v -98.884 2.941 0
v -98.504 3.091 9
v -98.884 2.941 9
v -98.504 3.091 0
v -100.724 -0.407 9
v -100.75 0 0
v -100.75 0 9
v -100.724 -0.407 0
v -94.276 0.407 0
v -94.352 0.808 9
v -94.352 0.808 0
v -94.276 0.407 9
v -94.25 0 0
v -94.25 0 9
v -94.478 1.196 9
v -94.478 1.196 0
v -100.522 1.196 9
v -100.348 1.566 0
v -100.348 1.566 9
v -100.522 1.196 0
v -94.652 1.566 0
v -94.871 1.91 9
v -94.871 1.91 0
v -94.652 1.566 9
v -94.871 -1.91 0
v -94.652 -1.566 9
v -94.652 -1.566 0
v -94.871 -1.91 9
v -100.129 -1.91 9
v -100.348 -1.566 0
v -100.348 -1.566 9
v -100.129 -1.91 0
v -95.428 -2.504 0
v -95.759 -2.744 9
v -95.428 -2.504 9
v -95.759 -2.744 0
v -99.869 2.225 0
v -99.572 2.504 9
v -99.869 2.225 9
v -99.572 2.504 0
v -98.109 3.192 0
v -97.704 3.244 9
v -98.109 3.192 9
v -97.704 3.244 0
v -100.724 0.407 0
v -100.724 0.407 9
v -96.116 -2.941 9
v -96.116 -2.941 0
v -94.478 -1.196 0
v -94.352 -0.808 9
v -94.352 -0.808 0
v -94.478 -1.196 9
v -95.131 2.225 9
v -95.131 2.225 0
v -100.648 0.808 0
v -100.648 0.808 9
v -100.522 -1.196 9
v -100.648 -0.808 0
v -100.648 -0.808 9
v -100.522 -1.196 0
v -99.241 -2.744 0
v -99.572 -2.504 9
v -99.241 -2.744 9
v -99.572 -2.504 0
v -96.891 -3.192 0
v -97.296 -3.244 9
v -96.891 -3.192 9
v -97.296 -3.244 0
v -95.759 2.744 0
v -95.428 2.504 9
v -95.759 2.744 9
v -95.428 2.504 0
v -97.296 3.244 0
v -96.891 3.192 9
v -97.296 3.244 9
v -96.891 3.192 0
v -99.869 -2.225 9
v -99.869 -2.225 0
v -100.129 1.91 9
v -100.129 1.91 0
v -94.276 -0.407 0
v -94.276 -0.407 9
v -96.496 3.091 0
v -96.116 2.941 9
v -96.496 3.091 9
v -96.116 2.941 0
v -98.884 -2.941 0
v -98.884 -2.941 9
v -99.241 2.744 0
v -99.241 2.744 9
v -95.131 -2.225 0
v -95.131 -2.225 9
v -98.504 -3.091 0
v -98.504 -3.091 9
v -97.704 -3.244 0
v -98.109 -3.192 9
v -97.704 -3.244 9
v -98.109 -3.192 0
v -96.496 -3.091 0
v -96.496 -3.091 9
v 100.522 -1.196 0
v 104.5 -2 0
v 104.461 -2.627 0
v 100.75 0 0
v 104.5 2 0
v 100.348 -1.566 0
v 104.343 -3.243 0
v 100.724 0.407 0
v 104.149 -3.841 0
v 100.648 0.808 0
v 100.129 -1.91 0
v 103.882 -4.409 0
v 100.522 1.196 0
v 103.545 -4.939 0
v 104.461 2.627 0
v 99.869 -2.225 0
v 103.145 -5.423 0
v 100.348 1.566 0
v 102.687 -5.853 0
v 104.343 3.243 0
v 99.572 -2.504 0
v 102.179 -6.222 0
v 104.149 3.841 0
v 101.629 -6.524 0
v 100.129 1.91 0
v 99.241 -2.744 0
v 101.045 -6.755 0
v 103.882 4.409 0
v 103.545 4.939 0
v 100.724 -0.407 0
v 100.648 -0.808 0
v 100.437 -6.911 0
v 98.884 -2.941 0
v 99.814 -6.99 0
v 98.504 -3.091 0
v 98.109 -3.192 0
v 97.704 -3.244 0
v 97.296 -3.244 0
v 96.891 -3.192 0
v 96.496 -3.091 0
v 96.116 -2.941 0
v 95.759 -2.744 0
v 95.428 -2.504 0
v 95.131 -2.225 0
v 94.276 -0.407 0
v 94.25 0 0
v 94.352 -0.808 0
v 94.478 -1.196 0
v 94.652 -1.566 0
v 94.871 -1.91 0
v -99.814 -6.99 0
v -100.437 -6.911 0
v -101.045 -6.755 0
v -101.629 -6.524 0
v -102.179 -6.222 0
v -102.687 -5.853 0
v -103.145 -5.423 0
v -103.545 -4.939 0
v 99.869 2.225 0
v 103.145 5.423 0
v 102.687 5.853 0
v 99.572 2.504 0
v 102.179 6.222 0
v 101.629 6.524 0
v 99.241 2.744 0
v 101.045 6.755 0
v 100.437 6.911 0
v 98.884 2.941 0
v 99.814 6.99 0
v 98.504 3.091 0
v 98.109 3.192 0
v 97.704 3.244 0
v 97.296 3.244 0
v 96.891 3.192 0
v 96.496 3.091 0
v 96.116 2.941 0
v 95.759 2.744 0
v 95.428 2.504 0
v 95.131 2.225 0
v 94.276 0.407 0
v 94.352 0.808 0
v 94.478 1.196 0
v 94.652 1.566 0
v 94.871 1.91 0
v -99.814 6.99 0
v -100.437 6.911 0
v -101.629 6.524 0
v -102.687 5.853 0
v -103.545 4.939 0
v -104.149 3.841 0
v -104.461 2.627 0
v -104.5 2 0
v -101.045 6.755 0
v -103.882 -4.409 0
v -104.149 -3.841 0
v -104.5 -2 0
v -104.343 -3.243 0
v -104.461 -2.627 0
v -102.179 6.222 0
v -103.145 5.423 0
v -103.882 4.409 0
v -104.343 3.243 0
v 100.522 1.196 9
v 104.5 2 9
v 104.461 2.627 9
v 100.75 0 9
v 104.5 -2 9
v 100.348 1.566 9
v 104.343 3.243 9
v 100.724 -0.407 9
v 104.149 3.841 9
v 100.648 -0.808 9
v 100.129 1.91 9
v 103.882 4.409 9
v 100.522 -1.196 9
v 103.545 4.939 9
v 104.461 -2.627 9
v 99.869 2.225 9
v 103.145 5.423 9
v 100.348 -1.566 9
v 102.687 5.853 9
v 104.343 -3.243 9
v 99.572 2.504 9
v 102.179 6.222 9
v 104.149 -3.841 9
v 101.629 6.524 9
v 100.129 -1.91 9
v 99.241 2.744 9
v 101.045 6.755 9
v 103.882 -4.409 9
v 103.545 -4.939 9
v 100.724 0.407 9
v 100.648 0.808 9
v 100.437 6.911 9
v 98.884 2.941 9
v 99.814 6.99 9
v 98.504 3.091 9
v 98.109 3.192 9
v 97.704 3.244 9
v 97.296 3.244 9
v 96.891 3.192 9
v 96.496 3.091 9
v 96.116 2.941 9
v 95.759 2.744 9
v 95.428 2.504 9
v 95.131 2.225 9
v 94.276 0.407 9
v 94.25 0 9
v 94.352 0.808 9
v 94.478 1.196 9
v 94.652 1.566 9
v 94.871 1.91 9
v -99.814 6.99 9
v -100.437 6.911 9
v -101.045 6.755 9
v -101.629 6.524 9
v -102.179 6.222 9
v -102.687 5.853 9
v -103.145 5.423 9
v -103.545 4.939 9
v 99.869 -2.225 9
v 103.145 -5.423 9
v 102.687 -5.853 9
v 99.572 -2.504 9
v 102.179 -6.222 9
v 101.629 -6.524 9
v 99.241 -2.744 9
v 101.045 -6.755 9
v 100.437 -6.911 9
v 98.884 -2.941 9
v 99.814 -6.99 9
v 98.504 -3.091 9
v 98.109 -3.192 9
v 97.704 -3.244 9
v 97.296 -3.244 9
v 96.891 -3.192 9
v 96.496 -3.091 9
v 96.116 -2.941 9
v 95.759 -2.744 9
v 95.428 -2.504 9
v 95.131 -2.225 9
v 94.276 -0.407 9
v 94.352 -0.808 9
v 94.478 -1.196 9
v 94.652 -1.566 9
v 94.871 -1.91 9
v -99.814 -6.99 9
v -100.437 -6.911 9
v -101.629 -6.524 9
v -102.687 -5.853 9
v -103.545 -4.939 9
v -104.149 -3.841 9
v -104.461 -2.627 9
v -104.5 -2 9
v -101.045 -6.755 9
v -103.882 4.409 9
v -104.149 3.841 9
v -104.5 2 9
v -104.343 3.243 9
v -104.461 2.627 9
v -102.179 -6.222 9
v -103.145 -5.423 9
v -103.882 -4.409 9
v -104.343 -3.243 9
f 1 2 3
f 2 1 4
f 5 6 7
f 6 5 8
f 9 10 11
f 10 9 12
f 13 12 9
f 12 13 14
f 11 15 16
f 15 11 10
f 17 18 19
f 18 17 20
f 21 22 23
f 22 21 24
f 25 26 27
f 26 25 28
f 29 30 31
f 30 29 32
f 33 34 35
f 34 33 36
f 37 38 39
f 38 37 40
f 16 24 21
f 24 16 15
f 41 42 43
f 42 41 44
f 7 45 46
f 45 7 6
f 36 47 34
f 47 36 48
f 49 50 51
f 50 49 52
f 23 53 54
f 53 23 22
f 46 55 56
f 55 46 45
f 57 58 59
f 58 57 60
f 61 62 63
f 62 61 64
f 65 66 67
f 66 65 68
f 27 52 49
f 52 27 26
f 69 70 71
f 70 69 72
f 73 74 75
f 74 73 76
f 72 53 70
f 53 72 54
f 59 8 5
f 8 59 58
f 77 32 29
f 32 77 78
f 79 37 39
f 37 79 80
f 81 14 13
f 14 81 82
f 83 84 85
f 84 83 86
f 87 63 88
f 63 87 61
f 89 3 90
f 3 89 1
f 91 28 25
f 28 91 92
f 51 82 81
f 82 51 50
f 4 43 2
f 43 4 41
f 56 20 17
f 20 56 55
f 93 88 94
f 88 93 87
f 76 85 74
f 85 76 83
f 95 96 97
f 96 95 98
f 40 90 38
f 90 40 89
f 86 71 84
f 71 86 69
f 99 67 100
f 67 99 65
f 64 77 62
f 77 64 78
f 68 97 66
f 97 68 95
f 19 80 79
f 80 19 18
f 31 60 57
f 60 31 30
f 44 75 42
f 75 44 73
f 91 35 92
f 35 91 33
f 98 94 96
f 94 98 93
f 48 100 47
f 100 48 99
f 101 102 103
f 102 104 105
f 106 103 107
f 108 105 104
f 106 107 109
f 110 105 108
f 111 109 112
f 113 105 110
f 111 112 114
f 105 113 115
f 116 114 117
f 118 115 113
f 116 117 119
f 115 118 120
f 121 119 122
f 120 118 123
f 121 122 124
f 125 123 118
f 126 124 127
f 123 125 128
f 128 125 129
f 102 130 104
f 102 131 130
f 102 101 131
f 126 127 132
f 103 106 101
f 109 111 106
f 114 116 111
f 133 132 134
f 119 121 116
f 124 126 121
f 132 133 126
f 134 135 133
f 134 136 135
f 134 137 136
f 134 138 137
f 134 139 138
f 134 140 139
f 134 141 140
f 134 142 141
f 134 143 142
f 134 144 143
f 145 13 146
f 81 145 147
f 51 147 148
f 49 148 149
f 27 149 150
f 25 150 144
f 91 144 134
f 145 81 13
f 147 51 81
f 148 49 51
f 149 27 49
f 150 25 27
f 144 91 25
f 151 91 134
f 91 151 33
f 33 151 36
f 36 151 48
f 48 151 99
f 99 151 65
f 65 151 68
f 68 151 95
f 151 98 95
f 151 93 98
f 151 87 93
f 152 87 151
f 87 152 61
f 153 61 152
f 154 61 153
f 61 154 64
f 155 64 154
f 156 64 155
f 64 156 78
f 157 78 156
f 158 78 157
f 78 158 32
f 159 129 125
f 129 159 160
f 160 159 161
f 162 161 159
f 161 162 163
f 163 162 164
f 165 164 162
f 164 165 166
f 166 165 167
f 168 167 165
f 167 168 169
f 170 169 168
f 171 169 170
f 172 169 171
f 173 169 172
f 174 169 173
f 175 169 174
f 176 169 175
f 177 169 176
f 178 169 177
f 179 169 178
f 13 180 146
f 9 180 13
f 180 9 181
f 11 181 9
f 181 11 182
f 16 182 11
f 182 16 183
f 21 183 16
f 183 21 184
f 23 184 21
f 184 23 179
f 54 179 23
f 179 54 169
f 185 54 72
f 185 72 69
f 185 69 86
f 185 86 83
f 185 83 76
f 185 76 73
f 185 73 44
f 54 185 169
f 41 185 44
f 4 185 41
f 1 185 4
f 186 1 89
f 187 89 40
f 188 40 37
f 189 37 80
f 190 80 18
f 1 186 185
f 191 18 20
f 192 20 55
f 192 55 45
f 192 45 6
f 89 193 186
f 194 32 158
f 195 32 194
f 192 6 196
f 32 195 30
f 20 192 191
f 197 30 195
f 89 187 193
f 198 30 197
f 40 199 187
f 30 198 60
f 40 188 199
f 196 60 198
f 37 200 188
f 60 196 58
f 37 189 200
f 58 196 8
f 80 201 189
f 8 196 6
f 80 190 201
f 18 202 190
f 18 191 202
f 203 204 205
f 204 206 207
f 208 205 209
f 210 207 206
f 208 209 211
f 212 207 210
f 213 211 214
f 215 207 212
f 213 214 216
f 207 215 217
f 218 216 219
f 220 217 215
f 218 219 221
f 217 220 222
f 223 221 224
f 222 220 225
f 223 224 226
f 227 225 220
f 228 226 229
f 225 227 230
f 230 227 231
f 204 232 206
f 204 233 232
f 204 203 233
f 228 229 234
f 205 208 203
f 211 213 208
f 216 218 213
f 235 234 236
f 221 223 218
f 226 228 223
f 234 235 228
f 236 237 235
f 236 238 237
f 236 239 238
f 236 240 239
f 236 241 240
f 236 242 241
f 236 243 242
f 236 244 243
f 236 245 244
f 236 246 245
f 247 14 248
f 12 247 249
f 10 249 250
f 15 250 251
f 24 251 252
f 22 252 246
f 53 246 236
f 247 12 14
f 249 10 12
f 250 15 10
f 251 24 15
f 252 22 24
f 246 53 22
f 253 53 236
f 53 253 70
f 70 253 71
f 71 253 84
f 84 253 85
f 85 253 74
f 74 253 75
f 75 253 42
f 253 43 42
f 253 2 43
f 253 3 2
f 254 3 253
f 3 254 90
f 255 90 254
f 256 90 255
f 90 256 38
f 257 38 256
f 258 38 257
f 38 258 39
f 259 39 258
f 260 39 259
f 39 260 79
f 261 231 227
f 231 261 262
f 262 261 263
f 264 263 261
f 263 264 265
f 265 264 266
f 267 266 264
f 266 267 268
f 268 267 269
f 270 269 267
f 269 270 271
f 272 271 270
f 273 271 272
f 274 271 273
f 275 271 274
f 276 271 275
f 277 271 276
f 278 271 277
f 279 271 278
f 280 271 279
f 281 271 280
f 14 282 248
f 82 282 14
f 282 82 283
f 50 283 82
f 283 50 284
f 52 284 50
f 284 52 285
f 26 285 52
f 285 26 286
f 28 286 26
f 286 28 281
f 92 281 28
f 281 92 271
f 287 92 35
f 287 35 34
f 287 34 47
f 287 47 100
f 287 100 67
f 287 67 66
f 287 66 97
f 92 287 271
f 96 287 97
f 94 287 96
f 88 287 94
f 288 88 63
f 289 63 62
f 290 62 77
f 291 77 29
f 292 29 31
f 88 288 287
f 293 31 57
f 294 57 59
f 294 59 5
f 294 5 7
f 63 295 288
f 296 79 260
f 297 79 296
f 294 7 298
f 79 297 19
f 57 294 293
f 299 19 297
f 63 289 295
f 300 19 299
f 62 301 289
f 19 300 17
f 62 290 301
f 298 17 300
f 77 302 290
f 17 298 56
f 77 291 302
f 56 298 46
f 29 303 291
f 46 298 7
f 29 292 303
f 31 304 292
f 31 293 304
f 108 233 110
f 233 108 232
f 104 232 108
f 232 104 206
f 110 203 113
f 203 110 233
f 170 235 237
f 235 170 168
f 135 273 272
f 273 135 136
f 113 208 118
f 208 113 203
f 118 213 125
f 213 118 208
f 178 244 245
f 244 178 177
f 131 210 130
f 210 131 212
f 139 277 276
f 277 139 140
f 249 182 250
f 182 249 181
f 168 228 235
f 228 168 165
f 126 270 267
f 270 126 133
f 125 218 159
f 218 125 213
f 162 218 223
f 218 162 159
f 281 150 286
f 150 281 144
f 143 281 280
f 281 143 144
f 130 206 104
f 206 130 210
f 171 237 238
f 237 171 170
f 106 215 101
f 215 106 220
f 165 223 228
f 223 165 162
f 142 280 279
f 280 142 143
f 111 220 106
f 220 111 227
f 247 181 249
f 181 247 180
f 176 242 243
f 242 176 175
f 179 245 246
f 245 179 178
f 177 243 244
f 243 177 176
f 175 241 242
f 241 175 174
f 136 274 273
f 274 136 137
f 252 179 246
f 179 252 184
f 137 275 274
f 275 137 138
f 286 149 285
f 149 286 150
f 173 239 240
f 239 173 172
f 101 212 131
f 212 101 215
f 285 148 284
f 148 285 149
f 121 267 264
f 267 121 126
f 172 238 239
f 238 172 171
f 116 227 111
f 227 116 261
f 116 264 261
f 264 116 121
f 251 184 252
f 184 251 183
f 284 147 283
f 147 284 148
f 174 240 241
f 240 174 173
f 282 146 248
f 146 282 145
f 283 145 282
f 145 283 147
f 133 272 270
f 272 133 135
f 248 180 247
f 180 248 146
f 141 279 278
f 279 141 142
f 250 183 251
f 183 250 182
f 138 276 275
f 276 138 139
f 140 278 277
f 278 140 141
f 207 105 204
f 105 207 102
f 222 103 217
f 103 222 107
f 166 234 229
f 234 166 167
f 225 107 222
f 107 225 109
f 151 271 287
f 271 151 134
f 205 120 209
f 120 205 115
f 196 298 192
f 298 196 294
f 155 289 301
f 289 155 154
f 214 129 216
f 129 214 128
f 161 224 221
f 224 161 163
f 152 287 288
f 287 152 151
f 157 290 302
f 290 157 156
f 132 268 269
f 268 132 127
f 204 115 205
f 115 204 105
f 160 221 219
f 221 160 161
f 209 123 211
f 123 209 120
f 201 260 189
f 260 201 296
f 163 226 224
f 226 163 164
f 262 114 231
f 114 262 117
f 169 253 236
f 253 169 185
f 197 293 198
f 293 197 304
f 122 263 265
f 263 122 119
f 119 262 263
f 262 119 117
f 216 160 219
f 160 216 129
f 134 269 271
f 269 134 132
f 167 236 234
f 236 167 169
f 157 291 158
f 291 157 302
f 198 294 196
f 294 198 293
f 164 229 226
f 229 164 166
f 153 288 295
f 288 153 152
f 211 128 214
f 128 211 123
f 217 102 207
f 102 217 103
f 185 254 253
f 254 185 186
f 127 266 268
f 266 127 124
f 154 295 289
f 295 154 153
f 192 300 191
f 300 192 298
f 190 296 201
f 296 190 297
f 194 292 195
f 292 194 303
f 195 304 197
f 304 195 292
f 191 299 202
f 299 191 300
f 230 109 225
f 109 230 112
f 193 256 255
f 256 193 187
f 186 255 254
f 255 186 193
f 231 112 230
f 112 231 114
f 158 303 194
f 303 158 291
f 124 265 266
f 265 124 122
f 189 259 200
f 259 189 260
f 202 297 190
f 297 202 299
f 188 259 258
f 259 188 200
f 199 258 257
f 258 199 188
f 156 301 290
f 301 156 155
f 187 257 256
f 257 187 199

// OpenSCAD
$fn = 50;


difference() {
	union() {
		hull() {
			translate(v = [-99.5000000000, 2.0000000000, 0]) {
				cylinder(h = 9, r = 5);
			}
			translate(v = [99.5000000000, 2.0000000000, 0]) {
				cylinder(h = 9, r = 5);
			}
			translate(v = [-99.5000000000, -2.0000000000, 0]) {
				cylinder(h = 9, r = 5);
			}
			translate(v = [99.5000000000, -2.0000000000, 0]) {
				cylinder(h = 9, r = 5);
			}
		}
	}
	union() {
		translate(v = [-97.5000000000, 0.0000000000, 0]) {
			cylinder(h = 9, r = 3.2500000000);
		}
		translate(v = [97.5000000000, 0.0000000000, 0]) {
			cylinder(h = 9, r = 3.2500000000);
		}
		translate(v = [-97.5000000000, 0.0000000000, 0]) {
			cylinder(h = 9, r = 1.8000000000);
		}
		translate(v = [97.5000000000, 0.0000000000, 0]) {
			cylinder(h = 9, r = 1.8000000000);
		}
		translate(v = [-97.5000000000, 0.0000000000, 0]) {
			cylinder(h = 9, r = 1.8000000000);
		}
		translate(v = [97.5000000000, 0.0000000000, 0]) {
			cylinder(h = 9, r = 1.8000000000);
		}
		translate(v = [-97.5000000000, 0.0000000000, 0]) {
			cylinder(h = 9, r = 1.8000000000);
		}
		translate(v = [97.5000000000, 0.0000000000, 0]) {
			cylinder(h = 9, r = 1.8000000000);
		}
	}
}
